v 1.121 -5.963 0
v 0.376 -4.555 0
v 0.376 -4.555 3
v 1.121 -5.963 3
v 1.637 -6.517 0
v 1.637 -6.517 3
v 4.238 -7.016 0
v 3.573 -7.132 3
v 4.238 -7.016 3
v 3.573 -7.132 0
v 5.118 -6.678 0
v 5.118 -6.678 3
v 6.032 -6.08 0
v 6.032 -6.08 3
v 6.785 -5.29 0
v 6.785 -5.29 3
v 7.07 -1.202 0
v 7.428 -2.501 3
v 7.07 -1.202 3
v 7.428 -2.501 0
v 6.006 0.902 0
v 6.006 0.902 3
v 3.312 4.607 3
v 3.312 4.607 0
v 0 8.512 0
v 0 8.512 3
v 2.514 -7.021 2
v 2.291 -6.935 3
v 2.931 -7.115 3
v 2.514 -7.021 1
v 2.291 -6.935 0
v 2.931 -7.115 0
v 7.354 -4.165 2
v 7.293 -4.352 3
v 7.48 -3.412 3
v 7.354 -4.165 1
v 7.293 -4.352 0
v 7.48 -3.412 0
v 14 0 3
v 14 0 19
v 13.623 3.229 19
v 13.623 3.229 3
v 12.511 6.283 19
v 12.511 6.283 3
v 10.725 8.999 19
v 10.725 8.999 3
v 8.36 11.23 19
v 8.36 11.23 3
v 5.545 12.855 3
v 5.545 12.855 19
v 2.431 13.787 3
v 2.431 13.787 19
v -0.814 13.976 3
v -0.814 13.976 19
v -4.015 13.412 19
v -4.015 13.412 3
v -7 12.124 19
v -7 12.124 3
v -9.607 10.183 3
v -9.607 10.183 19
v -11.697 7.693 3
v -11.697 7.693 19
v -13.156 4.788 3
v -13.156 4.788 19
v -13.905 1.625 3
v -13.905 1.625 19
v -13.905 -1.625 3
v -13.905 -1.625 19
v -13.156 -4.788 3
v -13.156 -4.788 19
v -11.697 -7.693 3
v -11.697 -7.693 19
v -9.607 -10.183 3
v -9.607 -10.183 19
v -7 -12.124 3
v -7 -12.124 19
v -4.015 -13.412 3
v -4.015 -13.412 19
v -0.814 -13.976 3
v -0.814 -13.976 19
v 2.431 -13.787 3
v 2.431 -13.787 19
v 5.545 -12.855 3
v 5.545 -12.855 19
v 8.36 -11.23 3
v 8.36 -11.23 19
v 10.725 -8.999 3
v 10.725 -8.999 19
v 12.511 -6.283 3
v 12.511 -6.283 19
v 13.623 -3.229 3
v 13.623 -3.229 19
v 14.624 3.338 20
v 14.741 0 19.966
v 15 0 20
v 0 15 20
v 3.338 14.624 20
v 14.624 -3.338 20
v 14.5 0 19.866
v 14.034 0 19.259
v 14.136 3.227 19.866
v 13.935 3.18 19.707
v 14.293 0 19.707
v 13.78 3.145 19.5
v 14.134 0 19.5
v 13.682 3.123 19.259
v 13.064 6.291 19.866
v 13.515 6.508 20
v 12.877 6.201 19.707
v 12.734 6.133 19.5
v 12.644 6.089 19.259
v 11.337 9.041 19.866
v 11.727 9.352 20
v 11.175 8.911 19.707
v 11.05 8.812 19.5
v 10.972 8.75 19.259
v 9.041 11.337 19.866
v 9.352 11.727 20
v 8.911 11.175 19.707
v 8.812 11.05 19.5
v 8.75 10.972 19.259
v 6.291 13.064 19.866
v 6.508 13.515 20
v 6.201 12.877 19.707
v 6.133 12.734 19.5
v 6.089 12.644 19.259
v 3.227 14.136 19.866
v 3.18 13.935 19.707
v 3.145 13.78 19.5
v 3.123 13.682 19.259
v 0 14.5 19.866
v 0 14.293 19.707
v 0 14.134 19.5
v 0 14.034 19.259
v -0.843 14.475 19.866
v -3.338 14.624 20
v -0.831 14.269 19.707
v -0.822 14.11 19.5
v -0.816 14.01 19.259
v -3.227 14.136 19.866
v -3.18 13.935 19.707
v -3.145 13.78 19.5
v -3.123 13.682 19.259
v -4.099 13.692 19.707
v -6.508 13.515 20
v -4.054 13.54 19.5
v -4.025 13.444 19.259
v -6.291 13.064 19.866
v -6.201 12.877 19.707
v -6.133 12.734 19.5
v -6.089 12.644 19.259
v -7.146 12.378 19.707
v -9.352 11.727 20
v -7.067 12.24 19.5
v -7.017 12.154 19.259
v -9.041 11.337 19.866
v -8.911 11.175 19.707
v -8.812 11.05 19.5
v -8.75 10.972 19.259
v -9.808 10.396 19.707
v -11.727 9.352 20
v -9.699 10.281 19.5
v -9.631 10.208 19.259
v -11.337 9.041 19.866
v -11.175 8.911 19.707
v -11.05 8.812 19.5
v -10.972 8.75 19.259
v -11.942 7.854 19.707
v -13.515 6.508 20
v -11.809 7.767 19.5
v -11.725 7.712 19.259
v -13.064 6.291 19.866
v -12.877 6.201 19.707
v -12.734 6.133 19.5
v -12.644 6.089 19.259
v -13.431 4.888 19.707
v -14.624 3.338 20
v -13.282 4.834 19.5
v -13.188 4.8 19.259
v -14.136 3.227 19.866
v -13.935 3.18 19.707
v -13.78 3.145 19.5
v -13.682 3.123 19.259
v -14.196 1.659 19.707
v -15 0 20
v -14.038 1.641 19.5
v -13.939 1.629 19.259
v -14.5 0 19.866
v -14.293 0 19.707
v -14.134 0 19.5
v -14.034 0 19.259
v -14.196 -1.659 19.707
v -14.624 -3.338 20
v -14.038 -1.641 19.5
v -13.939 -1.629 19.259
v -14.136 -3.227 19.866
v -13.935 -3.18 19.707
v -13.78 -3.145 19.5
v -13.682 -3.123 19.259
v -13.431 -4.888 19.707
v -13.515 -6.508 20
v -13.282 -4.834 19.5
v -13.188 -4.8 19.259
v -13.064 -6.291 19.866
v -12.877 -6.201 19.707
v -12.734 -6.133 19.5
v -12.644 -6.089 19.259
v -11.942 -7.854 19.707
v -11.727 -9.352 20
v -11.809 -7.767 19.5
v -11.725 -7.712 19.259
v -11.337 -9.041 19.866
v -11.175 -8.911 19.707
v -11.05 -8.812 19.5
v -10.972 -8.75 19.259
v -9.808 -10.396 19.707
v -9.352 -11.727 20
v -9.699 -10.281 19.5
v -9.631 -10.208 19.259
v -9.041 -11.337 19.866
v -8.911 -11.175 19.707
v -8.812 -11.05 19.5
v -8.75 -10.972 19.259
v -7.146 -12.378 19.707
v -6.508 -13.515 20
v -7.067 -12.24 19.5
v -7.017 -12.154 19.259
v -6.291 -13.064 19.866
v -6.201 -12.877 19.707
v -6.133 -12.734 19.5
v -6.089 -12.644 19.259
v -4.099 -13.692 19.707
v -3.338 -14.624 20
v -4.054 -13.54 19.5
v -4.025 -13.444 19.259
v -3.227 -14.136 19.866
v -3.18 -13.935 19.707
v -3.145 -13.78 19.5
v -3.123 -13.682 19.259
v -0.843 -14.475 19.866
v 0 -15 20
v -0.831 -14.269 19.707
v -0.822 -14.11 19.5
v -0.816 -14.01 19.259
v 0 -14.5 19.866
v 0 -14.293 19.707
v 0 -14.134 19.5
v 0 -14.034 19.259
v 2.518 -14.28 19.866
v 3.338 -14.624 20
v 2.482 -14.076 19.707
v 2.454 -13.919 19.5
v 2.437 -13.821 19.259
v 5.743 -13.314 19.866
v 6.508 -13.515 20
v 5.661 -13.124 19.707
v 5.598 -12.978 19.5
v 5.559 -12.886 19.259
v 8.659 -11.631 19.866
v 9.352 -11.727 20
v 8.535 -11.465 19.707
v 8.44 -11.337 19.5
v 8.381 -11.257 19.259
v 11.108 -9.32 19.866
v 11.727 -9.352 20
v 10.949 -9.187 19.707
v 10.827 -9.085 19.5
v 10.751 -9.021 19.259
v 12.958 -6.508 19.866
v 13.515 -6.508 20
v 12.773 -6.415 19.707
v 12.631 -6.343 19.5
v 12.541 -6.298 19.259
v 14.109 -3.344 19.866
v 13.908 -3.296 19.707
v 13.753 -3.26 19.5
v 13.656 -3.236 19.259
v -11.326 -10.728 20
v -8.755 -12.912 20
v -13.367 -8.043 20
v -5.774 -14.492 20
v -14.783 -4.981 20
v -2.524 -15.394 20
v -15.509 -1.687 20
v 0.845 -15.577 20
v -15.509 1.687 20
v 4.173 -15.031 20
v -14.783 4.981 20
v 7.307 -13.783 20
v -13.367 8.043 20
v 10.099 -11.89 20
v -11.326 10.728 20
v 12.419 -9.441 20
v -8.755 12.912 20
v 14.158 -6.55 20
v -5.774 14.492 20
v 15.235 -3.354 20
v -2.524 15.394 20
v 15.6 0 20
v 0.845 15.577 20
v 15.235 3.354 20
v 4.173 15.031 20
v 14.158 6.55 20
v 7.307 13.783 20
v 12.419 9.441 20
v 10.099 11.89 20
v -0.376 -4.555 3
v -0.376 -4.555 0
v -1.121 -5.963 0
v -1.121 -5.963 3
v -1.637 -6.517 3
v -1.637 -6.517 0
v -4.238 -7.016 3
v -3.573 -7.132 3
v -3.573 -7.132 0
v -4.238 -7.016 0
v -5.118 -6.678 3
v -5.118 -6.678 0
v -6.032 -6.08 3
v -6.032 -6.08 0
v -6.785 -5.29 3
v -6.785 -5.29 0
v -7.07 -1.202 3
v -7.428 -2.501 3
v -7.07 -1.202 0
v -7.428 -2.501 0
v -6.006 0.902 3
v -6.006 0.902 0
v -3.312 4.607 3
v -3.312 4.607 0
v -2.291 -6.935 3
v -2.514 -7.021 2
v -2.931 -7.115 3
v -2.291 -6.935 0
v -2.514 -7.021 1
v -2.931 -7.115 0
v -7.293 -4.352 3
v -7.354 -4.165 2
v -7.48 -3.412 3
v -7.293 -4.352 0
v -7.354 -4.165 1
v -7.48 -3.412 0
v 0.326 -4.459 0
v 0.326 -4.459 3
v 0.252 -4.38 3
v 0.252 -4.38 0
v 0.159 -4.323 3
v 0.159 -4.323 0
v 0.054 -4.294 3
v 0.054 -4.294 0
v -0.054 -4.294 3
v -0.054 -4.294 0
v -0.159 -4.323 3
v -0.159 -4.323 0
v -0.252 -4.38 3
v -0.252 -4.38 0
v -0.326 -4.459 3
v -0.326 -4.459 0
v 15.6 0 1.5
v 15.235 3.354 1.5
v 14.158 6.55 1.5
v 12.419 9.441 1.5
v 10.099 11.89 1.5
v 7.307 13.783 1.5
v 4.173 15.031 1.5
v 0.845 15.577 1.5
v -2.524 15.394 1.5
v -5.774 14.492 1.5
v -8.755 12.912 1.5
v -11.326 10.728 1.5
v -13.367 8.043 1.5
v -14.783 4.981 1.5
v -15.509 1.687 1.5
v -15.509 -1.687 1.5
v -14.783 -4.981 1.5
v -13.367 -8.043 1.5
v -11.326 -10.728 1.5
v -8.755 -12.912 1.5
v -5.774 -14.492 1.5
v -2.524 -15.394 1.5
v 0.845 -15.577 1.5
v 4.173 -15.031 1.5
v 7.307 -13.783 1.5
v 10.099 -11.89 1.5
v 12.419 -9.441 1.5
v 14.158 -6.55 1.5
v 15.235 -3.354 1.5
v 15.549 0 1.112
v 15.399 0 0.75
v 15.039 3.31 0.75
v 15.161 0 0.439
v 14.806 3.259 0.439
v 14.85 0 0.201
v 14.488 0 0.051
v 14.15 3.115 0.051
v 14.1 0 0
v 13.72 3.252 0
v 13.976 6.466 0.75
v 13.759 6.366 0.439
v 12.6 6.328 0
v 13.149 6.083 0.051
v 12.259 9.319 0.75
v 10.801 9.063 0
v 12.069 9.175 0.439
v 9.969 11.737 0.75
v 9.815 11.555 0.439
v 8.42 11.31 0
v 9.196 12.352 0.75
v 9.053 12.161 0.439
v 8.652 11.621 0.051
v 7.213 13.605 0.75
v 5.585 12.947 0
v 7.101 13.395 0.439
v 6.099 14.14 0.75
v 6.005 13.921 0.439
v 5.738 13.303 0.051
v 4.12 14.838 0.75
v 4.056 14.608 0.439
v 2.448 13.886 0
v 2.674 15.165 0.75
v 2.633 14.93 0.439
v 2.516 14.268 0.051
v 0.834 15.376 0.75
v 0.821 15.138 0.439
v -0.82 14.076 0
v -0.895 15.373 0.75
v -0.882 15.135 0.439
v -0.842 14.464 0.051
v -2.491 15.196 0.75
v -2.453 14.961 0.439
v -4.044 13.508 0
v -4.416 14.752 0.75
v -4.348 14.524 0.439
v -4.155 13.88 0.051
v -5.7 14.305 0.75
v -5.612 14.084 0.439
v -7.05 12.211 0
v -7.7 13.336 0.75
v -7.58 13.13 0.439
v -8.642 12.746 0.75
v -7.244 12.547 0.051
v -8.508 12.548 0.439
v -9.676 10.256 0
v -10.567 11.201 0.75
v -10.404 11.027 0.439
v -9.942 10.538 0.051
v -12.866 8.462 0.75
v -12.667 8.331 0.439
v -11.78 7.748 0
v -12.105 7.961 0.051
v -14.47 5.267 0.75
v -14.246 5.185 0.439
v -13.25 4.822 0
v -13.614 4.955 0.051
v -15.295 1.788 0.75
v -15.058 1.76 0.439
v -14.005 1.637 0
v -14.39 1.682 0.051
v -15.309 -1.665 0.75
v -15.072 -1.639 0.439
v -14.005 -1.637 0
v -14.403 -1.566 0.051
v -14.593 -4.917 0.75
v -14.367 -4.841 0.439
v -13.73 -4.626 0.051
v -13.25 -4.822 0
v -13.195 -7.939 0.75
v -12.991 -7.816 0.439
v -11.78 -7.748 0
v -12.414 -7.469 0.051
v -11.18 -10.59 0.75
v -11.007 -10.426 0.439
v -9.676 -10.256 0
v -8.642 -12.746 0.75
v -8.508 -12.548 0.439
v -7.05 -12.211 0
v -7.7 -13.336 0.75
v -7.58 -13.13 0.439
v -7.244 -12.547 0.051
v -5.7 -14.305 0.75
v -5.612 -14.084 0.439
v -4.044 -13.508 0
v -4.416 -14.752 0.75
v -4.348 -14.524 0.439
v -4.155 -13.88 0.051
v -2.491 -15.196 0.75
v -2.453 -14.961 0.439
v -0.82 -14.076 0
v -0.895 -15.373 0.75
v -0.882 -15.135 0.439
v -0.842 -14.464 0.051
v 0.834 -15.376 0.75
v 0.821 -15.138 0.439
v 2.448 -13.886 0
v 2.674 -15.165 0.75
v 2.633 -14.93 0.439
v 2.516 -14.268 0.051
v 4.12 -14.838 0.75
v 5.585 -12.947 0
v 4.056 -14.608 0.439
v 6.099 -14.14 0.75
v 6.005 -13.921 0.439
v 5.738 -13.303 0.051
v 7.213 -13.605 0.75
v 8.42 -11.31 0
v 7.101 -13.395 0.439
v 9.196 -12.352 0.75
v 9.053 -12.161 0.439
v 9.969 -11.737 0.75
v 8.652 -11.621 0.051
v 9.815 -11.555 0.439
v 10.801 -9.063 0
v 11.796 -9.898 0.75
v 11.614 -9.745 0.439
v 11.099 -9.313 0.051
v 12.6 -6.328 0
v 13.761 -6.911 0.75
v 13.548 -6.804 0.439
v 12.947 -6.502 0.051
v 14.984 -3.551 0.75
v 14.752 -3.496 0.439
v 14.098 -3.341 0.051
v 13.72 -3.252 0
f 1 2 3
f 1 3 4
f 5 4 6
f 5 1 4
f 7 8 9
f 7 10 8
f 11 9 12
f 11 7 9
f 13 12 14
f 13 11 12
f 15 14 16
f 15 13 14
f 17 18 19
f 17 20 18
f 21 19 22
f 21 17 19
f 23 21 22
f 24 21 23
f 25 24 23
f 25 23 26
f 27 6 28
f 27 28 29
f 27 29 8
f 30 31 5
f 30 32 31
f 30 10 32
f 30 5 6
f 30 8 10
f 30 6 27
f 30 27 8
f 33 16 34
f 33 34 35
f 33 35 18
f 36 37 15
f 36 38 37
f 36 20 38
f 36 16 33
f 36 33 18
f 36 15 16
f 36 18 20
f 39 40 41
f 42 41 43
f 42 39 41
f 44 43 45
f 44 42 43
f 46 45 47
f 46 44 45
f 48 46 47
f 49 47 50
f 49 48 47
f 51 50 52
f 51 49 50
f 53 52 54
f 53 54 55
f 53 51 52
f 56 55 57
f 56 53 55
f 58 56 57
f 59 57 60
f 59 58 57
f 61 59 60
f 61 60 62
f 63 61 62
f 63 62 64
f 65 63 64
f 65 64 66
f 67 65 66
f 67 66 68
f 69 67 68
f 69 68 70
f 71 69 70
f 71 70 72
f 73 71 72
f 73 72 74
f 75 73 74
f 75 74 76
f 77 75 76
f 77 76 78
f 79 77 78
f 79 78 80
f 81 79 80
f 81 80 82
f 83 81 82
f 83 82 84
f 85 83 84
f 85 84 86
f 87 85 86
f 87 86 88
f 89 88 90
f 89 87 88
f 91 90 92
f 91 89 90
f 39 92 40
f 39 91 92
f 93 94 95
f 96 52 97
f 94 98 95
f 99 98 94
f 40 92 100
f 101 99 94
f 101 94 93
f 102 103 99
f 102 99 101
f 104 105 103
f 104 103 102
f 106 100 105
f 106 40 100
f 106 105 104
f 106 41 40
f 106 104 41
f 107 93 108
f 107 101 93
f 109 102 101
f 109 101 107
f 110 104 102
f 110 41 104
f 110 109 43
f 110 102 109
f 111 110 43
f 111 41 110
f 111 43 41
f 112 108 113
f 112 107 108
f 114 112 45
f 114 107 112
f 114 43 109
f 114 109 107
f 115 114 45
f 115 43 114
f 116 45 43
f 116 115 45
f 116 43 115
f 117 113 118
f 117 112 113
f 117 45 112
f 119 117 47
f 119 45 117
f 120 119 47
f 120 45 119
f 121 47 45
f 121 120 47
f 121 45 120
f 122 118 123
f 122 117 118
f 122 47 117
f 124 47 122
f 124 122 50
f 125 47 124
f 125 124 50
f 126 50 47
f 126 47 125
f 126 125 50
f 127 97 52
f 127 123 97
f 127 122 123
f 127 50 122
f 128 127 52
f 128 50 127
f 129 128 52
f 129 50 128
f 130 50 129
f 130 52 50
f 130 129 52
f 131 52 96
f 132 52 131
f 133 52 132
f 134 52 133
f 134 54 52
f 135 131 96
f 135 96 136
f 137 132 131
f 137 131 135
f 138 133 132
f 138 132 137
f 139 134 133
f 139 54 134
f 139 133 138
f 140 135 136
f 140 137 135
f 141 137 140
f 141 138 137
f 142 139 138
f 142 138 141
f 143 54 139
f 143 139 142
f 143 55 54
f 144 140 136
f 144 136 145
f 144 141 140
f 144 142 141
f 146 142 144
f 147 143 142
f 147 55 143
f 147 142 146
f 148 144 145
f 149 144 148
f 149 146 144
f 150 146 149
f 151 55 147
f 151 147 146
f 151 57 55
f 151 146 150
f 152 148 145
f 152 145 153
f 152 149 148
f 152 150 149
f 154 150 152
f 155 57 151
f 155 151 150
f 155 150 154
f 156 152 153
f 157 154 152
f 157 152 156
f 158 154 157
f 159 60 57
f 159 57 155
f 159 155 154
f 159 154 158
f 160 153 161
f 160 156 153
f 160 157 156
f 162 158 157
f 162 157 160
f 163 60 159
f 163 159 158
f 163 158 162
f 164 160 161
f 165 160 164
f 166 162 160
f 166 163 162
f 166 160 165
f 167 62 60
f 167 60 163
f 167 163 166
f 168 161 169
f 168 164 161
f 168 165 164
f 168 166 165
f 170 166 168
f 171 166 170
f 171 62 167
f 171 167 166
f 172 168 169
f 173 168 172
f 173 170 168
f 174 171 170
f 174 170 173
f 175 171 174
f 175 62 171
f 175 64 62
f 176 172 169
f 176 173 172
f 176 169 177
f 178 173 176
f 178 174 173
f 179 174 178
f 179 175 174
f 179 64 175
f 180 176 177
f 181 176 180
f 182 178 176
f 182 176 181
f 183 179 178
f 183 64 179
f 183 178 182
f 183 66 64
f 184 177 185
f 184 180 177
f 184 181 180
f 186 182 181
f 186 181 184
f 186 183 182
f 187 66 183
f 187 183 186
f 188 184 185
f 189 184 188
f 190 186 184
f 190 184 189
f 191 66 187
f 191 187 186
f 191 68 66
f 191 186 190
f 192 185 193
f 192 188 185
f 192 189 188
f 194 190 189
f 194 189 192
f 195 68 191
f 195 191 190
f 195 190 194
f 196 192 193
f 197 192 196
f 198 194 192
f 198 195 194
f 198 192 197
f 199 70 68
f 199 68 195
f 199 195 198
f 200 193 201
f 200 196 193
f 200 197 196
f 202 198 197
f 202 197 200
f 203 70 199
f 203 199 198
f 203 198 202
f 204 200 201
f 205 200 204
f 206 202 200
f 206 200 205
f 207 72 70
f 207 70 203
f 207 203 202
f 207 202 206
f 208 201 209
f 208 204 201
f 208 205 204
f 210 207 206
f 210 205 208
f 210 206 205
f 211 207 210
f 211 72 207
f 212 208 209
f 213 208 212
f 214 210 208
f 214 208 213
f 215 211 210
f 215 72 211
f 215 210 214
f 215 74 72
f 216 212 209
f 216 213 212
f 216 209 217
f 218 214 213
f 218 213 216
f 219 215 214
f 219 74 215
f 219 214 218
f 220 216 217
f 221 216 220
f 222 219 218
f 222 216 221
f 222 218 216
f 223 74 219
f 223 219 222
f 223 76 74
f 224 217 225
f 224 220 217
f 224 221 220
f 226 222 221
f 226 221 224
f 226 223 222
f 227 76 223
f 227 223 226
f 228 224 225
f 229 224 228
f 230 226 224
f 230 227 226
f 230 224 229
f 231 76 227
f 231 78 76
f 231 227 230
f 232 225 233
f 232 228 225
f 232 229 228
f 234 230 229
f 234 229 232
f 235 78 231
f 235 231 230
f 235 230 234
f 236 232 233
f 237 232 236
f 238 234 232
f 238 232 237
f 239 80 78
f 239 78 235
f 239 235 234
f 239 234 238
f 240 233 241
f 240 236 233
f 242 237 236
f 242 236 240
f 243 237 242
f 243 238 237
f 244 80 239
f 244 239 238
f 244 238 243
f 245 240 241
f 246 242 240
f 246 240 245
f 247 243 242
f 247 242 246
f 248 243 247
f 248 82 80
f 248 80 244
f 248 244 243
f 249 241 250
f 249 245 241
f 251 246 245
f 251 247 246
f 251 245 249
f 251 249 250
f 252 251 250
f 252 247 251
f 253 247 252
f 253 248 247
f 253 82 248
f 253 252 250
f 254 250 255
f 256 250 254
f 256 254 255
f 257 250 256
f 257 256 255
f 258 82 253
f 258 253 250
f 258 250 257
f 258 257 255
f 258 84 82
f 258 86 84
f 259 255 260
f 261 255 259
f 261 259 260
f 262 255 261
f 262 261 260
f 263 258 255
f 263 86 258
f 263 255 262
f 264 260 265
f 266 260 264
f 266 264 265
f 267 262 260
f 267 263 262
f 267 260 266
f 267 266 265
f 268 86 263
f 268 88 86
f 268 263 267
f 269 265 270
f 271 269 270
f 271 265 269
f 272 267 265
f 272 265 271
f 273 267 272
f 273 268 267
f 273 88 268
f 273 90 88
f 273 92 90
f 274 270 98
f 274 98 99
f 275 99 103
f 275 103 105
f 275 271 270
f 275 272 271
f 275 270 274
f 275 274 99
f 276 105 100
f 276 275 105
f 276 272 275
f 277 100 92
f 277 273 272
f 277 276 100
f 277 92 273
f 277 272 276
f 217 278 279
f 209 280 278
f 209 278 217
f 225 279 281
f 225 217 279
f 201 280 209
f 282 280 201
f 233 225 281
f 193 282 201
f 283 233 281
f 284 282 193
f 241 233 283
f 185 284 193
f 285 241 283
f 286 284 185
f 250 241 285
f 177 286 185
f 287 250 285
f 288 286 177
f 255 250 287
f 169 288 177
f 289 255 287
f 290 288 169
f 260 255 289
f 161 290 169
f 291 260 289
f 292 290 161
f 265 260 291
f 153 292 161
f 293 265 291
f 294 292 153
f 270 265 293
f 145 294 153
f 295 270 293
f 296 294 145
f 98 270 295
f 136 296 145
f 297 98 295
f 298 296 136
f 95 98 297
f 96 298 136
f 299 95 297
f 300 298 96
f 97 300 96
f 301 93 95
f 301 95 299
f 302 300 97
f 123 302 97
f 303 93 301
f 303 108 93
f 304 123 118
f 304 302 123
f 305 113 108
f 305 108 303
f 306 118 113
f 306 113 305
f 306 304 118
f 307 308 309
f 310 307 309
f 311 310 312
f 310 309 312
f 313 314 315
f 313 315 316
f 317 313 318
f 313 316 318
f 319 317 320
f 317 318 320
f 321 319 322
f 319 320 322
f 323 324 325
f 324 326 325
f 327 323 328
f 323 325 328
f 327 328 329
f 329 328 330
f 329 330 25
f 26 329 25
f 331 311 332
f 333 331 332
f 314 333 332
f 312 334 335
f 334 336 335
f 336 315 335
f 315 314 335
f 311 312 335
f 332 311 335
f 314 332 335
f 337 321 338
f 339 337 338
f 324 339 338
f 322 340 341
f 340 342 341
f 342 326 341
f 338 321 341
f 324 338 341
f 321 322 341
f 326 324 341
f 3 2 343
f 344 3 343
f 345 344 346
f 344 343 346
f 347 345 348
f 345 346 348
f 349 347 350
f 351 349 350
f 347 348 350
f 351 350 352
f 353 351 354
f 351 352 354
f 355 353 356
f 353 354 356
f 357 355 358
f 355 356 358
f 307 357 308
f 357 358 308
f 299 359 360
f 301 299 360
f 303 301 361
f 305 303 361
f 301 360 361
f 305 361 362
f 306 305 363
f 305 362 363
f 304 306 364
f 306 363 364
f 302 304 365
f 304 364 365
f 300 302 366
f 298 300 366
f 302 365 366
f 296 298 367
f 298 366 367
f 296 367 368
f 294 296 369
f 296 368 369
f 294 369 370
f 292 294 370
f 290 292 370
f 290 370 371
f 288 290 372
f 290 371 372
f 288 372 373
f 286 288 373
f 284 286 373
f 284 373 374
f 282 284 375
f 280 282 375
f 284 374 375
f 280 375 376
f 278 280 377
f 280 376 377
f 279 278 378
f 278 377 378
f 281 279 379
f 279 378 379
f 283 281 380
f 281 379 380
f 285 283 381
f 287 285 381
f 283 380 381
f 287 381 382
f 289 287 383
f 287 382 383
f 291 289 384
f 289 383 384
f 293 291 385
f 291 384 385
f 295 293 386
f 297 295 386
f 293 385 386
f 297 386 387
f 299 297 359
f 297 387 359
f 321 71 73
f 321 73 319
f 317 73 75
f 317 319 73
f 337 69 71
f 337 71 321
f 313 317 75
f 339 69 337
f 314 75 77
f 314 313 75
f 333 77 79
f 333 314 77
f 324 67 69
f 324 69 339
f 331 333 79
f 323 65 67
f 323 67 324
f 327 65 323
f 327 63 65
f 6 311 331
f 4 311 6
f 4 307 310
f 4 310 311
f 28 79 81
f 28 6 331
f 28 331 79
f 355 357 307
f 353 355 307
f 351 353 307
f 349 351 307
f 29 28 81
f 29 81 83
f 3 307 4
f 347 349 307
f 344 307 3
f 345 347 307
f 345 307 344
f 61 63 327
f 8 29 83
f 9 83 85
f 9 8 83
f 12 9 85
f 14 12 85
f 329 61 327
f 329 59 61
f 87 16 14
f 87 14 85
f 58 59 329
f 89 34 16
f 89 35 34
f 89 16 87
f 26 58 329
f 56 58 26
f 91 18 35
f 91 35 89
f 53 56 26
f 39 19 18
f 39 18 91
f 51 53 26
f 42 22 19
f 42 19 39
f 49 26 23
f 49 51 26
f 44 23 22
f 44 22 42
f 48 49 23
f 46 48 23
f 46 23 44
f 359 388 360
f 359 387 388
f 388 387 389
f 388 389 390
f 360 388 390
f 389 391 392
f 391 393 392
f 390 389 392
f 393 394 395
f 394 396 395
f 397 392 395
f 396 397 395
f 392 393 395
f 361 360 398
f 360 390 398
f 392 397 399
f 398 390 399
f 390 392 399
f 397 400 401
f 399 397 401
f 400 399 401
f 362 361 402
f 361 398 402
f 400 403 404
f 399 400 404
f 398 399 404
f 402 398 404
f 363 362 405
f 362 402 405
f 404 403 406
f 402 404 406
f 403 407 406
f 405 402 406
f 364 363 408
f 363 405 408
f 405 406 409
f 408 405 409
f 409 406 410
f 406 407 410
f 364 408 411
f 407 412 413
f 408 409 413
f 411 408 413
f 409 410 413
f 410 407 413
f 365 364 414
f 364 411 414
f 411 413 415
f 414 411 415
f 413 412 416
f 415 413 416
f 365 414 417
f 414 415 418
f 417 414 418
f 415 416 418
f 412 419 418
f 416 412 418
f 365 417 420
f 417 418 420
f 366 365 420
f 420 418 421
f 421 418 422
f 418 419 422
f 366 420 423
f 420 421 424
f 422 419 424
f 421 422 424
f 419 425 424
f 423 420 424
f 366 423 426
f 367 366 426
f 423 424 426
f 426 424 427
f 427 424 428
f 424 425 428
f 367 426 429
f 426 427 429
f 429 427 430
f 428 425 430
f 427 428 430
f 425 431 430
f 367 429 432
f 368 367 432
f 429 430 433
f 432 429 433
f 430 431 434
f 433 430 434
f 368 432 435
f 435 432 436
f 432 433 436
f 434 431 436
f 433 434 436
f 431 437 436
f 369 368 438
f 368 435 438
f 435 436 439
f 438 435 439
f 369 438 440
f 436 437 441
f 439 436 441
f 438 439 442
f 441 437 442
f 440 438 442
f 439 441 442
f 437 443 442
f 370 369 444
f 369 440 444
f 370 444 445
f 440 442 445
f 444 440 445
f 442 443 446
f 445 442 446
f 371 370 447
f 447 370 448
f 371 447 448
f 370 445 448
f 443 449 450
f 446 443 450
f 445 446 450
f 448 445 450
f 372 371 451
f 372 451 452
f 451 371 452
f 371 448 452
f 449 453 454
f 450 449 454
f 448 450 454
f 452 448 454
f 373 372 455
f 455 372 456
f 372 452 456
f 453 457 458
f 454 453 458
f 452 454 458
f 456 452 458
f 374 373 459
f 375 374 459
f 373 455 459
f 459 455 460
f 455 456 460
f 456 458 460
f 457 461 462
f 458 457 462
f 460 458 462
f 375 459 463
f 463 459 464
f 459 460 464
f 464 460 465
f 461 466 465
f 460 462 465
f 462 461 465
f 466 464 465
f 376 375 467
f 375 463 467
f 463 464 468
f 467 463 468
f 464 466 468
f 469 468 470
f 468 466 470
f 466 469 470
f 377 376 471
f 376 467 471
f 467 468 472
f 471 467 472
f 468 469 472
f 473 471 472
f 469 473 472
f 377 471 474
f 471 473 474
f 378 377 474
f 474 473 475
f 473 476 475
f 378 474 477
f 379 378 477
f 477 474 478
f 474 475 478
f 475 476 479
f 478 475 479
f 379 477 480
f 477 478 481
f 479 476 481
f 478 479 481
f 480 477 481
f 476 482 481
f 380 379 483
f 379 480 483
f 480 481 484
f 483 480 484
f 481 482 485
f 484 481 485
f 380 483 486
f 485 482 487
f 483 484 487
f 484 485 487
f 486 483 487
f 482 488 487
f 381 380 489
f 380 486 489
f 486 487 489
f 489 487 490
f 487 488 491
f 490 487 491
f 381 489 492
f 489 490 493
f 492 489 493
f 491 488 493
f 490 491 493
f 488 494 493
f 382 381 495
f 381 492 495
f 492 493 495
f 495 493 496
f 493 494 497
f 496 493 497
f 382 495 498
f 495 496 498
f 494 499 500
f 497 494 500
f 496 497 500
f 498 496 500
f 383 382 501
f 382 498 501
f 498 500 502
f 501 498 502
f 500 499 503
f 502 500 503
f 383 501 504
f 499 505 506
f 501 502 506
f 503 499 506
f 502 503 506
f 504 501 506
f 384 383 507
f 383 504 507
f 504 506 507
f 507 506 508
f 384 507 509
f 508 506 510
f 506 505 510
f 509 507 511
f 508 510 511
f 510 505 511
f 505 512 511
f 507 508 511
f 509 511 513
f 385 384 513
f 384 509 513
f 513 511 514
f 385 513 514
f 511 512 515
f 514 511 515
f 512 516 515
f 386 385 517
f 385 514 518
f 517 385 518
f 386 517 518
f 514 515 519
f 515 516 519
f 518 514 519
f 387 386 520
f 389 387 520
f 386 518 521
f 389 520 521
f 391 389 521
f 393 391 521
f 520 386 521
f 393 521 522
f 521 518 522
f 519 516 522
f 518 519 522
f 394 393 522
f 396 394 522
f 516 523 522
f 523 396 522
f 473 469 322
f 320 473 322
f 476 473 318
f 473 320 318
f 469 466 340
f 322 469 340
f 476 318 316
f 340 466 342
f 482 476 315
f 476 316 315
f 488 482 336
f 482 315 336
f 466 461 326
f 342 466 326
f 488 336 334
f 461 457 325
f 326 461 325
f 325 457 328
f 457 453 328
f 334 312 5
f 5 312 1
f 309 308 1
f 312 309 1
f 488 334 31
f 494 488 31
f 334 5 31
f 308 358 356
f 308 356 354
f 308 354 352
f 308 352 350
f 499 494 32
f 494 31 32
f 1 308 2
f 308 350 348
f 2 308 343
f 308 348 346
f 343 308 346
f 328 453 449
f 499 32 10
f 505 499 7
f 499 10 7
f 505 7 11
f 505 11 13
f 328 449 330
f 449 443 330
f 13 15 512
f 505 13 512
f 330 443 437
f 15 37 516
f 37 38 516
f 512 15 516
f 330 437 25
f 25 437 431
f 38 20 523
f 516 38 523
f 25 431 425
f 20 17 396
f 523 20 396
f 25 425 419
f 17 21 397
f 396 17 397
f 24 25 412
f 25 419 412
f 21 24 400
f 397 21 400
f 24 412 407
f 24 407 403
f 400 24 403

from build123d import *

# Parameters (mm, degrees)
F0_R        = 15.6
F0_R_2      = 14
F0_R_3      = 2
F1_DEPTH    = 3
F2_DEPTH    = 20
F3_R        = 1.5
F4_R        = 1
F5_R        = 2
F6_DEPTH    = 3
F7_T1_DEPTH = 3


# Not quite as in the source:
# - a fillet or chamfer that OpenCascade refuses, or shapes differently, is made with other operations: its cross-section is extruded or revolved along the edge and cut away or added


with BuildPart() as f1:
    # F0 (on Top) → F1 (new body)
    with BuildSketch(Plane.XY):
        Circle(F0_R)
        Circle(F0_R_2, mode=Mode.SUBTRACT)
        Circle(F0_R_2)
        Circle(F0_R_3, mode=Mode.SUBTRACT)
        Circle(F0_R_3)
    extrude(amount=F1_DEPTH)

    # F0 (on Top) → F2 (join)
    with BuildSketch(Plane.XY):
        Circle(F0_R)
        Circle(F0_R_2, mode=Mode.SUBTRACT)
    extrude(amount=F2_DEPTH)

    # F3
    f3_edges = [f1.edges().sort_by_distance(p)[0] for p in [
        (-15.6, 0, 0),
    ]]
    fillet(f3_edges, radius=F3_R)

    # F4
    f4_edges = [f1.edges().sort_by_distance(p)[0] for p in [
        (-14, 0, 20),
    ]]
    fillet(f4_edges, radius=F4_R)

    # F5 (on face) + F0 (on Top) → F6 (cut, through all)
    with BuildSketch(Plane.XY):
        with BuildLine():
            add(Edge.make_bspline(
                [(0, -2.5137708586), (0, -4.1458795261), (-1.7837920859, -8.9341028845), (-10.8913647651, -3.867257191), (-4.0863468312, 3.7691965699), (0, 8.5115667947)],
                knots=[0, 0, 0, 0, 0.2681845993, 0.5480579368, 1, 1, 1, 1], degree=3))
            add(Edge.make_bspline(
                [(0, -2.5137708586), (0, -4.1458795261), (1.7837920859, -8.9341028845), (10.8913647651, -3.867257191), (4.0863468312, 3.7691965699), (0, 8.5115667947)],
                knots=[0, 0, 0, 0, 0.2681845993, 0.5480579368, 1, 1, 1, 1], degree=3))
        make_face()
        Circle(F5_R, mode=Mode.SUBTRACT)
    with BuildSketch(Plane.XY):
        Circle(F0_R_3)
    extrude(amount=F6_DEPTH, mode=Mode.SUBTRACT)

    # F7: fillet of radius 0.4 on 1 edges, made by hand

    # F7_s2 → F7_t1 (cut)
    with BuildSketch(Plane.XY):
        with BuildLine():
            ThreePointArc((0.3762881855, -4.5548185088), (0, -4.2904916507), (-0.3762881855, -4.5548185088))
            Line((-0.3762881855, -4.5548185088), (-0.3838139492, -4.5521050459))
            ThreePointArc((-0.3838139492, -4.5521050459), (-0.1103093457, -3.5489845707), (-0.008, -2.5137708586))
            Line((-0.008, -2.5137708586), (0.008, -2.5137708586))
            ThreePointArc((0.008, -2.5137708586), (0.1103093457, -3.5489845707), (0.3838139492, -4.5521050459))
            Line((0.3838139492, -4.5521050459), (0.3762881855, -4.5548185088))
        make_face()
    extrude(amount=F7_T1_DEPTH, mode=Mode.SUBTRACT)


solid = f1.part
